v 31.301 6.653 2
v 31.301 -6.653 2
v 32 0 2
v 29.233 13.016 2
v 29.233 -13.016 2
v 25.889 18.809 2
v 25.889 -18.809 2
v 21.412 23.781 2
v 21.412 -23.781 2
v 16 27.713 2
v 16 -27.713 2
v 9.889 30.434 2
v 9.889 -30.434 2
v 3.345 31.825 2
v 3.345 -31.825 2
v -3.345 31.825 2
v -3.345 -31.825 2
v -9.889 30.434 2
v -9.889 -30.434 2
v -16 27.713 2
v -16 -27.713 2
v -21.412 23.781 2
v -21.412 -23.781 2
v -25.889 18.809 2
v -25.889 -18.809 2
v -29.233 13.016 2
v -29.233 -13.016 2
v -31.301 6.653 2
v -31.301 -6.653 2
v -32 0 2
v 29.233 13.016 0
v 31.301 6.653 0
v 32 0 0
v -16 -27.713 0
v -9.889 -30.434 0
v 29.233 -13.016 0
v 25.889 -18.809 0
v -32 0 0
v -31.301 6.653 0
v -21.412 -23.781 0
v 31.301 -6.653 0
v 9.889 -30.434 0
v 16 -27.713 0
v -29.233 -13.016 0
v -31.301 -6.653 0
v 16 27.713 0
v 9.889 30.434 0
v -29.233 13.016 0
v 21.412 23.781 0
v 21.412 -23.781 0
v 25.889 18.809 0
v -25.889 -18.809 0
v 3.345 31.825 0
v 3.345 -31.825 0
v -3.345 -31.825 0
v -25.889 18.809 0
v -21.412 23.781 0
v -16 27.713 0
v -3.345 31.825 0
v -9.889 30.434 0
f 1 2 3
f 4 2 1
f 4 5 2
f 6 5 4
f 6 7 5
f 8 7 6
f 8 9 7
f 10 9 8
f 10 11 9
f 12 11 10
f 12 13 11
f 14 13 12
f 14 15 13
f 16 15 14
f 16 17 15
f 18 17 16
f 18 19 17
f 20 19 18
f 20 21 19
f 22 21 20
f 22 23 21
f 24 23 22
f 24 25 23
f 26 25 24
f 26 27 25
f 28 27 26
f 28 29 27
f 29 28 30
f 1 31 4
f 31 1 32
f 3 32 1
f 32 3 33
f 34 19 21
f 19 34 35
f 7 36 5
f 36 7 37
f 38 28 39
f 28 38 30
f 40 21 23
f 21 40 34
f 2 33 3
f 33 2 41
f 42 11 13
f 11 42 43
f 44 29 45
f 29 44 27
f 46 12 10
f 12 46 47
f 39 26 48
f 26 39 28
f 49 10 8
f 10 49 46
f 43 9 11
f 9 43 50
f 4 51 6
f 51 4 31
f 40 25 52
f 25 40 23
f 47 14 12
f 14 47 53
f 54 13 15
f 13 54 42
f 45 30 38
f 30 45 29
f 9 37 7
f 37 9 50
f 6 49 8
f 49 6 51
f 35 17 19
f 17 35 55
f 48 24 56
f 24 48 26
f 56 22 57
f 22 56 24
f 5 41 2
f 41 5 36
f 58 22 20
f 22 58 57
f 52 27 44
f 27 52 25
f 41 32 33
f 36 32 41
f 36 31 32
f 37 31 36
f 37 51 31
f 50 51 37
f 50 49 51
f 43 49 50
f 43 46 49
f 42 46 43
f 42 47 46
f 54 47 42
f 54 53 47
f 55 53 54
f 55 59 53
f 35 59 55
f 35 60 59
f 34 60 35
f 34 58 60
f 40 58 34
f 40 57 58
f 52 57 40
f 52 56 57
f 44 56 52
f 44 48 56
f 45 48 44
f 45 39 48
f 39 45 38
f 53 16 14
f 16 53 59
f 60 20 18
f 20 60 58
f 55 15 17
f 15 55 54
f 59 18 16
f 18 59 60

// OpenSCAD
// [FL_INDEX: keywords="openscad, 3d_parametric, Circular_Gallifreyan_Coin, csg_solid" | COT="Parametric OpenSCAD design from 3DCodeverse"]
// Title: Circular Gallifreyan Coin

// Word to display
word = "thingiverse";

// Radius of coin
outer_radius = 32;

// Thickness of coin
coin_thickness = 2;

// Radius of writing
pendant_radius = 20;

// Radius of the large circles in a letter
letter_radius = 10;

// Thickness of writing
line_thickness = 1;

// Height of writing
line_height = 1;


/////////////////////////////////////////
//CUSTOMIZER VARIABLES END
/////////////////////////////////////////

large_circle_radius = letter_radius;
small_circle_radius = letter_radius/4;

large_dot_radius = letter_radius/7;
small_dot_radius = letter_radius/8;

dot_offset = large_circle_radius/4*3;

chars_in_word = lenWord(word, 0, len(word));
spacing_angle = 360 / chars_in_word;

// draw the coin if it's valid
if (len(word) > 0 && isValidWord(word))
{
  difference()
  {
    linear_extrude(height=coin_thickness)
      circle(outer_radius);

    translate([0,0,coin_thickness-line_height])
      linear_extrude(height=line_height+0.1)
      rotate([0,0,-90])
      write_circle();
  }
}
else
{
  echo("invalid input");
}

/////////////////////////////////////////
// TEXT HELPER ROUTINES

function isVowel(t,p,l) = (l - p > 0)
                       && (t[p] == "a" || t[p] == "e" || t[p] == "i" || t[p] == "o" || t[p] == "u");
function isConsWithH(t,p,l) = (l - p > 1)
                           && (t[p+1] == "h")
                           && (t[p] == "t" || t[p] == "s" || t[p] == "c");
function isConsNG(t,p,l) = (l - p > 1)
                        && t[p] == "n"
                        && t[p+1] == "g";
function isConsQU(t,p,l) = (l - p > 1)
                        && t[p] == "q"
                        && t[p+1] == "u";
function isCons2(t,p,l) = isConsWithH(t,p,l) || isConsNG(t,p,l) || isConsQU(t,p,l);
function isCons1(t,p,l) = (l - p > 0)
                       && (t[p] == "b" || t[p] == "d" || t[p] == "f" || t[p] == "g" || t[p] == "h" ||
                           t[p] == "j" || t[p] == "k" || t[p] == "l" || t[p] == "m" || t[p] == "n" ||
                           t[p] == "p" || t[p] == "t" || t[p] == "r" || t[p] == "s" || t[p] == "v" ||
                           t[p] == "w" || t[p] == "y" || t[p] == "z" || t[p] == "x");
function isCons2WithVowel(t,p,l) = isVowel(t,p+2,l) && isCons2(t,p,l);
function isCons1WithVowel(t,p,l) = isVowel(t,p+1,l) && isCons1(t,p,l);

function isValid(t,p,l) = l == p ? true
                        : isVowel(t,p,l) ? isValid(t,p+1,l)
                        : isCons2(t,p,l) ? isValid(t,p+2,l)
                        : isCons1(t,p,l) ? isValid(t,p+1,l) : false;

function lenWord(t,p,l) = isVowel(t,p,l) ? 1 + lenWord(t,p+1,l)
                        : isCons2WithVowel(t,p,l) ? 1 + lenWord(t,p+3,l)
                        : isCons1WithVowel(t,p,l) ? 1 + lenWord(t,p+2,l)
                        : isCons2(t,p,l) ? 1 + lenWord(t,p+2,l)
                        : isCons1(t,p,l) ? 1 + lenWord(t,p+1,l)
                        : 0;

function isValidWord(txt) = isValid(txt,0,len(txt));

function isLetterStart(s,t,p,l) = s == p ? true
                                : s < p ? false
                                : isVowel(t,p,l) ? isLetterStart(s,t,p+1,l)
                                : isCons2WithVowel(t,p,l) ? isLetterStart(s,t,p+3,l)
                                : isCons1WithVowel(t,p,l) ? isLetterStart(s,t,p+2,l)
                                : isCons2(t,p,l) ? isLetterStart(s,t,p+2,l)
                                : isCons1(t,p,l) ? isLetterStart(s,t,p+1,l)
                                : false;
function whichLetter(s,t,p,l) = s <= p ? 0
                                : isVowel(t,p,l) ? 1 + whichLetter(s,t,p+1,l)
                                : isCons2WithVowel(t,p,l) ? 1 + whichLetter(s,t,p+3,l)
                                : isCons1WithVowel(t,p,l) ? 1 + whichLetter(s,t,p+2,l)
                                : isCons2(t,p,l) ? 1 + whichLetter(s,t,p+2,l)
                                : isCons1(t,p,l) ? 1 + whichLetter(s,t,p+1,l)
                                : 0;

/////////////////////////////////////////
// GENERATE THE WRITING

module write_circle()
{
  for (letter = [0 : len(word)-1])
  {
    if (isLetterStart(letter, word, 0, len(word)))
    {
      rotate([0, 0, spacing_angle * whichLetter(letter, word, 0, len(word))])
        translate([pendant_radius, 0, 0])
        write_circle_letter(word, letter, len(word));
    }
  }
}

module write_circle_letter(t,p,l)
{
  // centered around positive x-axis

  if (p < l)
  {
    if (isVowel(t,p,l))
    {
      translate([-pendant_radius, 0, 0])
        arc_segment(spacing_angle, pendant_radius);

      write_vowel(t[p]);
    }
    else if (isCons2(t,p,l))
    {
      write_consonant(str(t[p],t[p+1]), isCons2WithVowel(t,p,l) ? t[p+2] : undef);
    }
    else if (isCons1(t,p,l))
    {
      write_consonant(t[p], isCons1WithVowel(t,p,l) ? t[p+1] : undef);
    }
    else
    {
      echo("wha? invalid character");
    }
  }
}

module write_vowel(c)
{
  if (c == "a")
  {
    translate([letter_radius/2,0,0])
      circle_line(small_circle_radius);
  }
  else if (c == "e")
  {
    circle_line(small_circle_radius);
  }
  else if (c == "i")
  {
    circle_line(small_circle_radius);
    rotate([0,0,180])
      translate([small_circle_radius,0,0])
      line(letter_radius - small_circle_radius);
  }
  else if (c == "o")
  {
    translate([-letter_radius/2,0,0])
    circle_line(small_circle_radius);
  }
  else if (c == "u")
  {
    circle_line(small_circle_radius);
    translate([small_circle_radius,0,0])
      line(letter_radius - small_circle_radius);
  }
  else
  {
    echo("wha? invalid vowel");
  }
}

module write_consonant(c,v)
{
  // SET 1
  if (c == "b" || c == "ch" || c == "d" || c == "f" || c == "g" || c == "h")
  {
    difference()
    {
      union()
      {
        translate([-pendant_radius, 0, 0])
          arc_segment(spacing_angle, pendant_radius);
        translate([-large_circle_radius,0,0])
          circle_line(large_circle_radius);
      }
      square(small_circle_radius*2, center=true);
    }

    translate([-large_circle_radius,0,0])
    {
      if (c == "ch")     write_circle_modifier(1);
      else if (c == "d") write_circle_modifier(2);
      else if (c == "f") write_circle_modifier(3);
      else if (c == "g") write_circle_modifier(4);
      else if (c == "h") write_circle_modifier(5);

      if (v) write_vowel(v);
    }
  }
  // SET 2
  else if (c == "j" || c == "k" || c == "l" || c == "m" || c == "n" || c == "p")
  {
    translate([-pendant_radius, 0, 0])
      arc_segment(spacing_angle, pendant_radius);

    translate([-large_circle_radius-large_dot_radius,0,0])
    {
      circle_line(large_circle_radius);

      if (c == "k")      write_circle_modifier(1);
      else if (c == "l") write_circle_modifier(2);
      else if (c == "m") write_circle_modifier(3);
      else if (c == "n") write_circle_modifier(4);
      else if (c == "p") write_circle_modifier(5);

      if (v) write_vowel(v);
    }
  }
  // SET 3
  else if (c == "t" || c == "sh" || c == "r" || c == "s" || c == "v" || c == "w")
  {
    difference()
    {
      translate([-pendant_radius, 0, 0])
        arc_segment(spacing_angle, pendant_radius);
      circle(large_circle_radius - line_thickness/2);
    }
    difference()
    {
      rotate(180) arc_segment(180, large_circle_radius);
      difference()
      {
        translate([-pendant_radius,0,0]) circle(pendant_radius+large_circle_radius);
        translate([-pendant_radius,0,0]) circle(pendant_radius);
      }
    }

    if (c == "sh")     write_circle_modifier(1);
    else if (c == "r") write_circle_modifier(2);
    else if (c == "s") write_circle_modifier(3);
    else if (c == "v") write_circle_modifier(4);
    else if (c == "w") write_circle_modifier(5);

    if (v) write_vowel(v);
  }
  // SET 4
  else if (c == "th" || c == "y" || c == "z" || c == "ng" || c == "qu" || c == "x")
  {
    translate([-pendant_radius, 0, 0])
      arc_segment(spacing_angle, pendant_radius);

    circle_line(large_circle_radius);

    if (c == "y")       write_circle_modifier(1);
    else if (c == "z")  write_circle_modifier(2);
    else if (c == "ng") write_circle_modifier(3);
    else if (c == "qu") write_circle_modifier(4);
    else if (c == "x")  write_circle_modifier(5);

    if (v) write_vowel(v);
  }
  else
  {
    echo("wha? invalid consonant");
  }
}

module write_circle_modifier(y)
{
  if (y == 1)
  {
    rotate(-45) translate([-dot_offset,0,0]) circle(large_dot_radius);
    rotate(-70) translate([-dot_offset,0,0]) circle(small_dot_radius);
  }
  else if (y == 2)
  {
    rotate(-40) translate([-dot_offset,0,0]) circle(small_dot_radius);
    rotate(-65) translate([-dot_offset,0,0]) circle(large_dot_radius);
    rotate(-90) translate([-dot_offset,0,0]) circle(small_dot_radius);
  }
  else if (y == 3)
  {
    rotate(180+15) translate([large_circle_radius,0,0]) line(letter_radius);
    rotate(180   ) translate([large_circle_radius,0,0]) line(letter_radius);
    rotate(180-15) translate([large_circle_radius,0,0]) line(letter_radius);
  }
  else if (y == 4)
  {
    rotate(180   ) translate([large_circle_radius,0,0]) line(letter_radius);
  }
  else if (y == 5)
  {
    rotate(180+15) translate([large_circle_radius,0,0]) line(letter_radius);
    rotate(180-15) translate([large_circle_radius,0,0]) line(letter_radius);
  }
}

/////////////////////////////////////////
// WRITING HELPERS

module arc_segment(angle, radius, thick)
{
  // centered around positive x-axis

  pos_x = cos(angle/2) * radius * 1.5;
  pos_y = sin(angle/2) * radius * 1.5;

  intersection()
  {
    if (angle < 360)
      polygon([ [0,0], [pos_x,-pos_y], [radius * 1.5,0], [pos_x,+pos_y] ]);

    circle_line(radius);
  }
}

module circle_line(radius)
{
  difference()
  {
    circle(radius + line_thickness/2);
    circle(radius - line_thickness/2);
  }
}

module line(length)
{
  translate([0,-line_thickness/2,0])
    square([length, line_thickness]);
}
